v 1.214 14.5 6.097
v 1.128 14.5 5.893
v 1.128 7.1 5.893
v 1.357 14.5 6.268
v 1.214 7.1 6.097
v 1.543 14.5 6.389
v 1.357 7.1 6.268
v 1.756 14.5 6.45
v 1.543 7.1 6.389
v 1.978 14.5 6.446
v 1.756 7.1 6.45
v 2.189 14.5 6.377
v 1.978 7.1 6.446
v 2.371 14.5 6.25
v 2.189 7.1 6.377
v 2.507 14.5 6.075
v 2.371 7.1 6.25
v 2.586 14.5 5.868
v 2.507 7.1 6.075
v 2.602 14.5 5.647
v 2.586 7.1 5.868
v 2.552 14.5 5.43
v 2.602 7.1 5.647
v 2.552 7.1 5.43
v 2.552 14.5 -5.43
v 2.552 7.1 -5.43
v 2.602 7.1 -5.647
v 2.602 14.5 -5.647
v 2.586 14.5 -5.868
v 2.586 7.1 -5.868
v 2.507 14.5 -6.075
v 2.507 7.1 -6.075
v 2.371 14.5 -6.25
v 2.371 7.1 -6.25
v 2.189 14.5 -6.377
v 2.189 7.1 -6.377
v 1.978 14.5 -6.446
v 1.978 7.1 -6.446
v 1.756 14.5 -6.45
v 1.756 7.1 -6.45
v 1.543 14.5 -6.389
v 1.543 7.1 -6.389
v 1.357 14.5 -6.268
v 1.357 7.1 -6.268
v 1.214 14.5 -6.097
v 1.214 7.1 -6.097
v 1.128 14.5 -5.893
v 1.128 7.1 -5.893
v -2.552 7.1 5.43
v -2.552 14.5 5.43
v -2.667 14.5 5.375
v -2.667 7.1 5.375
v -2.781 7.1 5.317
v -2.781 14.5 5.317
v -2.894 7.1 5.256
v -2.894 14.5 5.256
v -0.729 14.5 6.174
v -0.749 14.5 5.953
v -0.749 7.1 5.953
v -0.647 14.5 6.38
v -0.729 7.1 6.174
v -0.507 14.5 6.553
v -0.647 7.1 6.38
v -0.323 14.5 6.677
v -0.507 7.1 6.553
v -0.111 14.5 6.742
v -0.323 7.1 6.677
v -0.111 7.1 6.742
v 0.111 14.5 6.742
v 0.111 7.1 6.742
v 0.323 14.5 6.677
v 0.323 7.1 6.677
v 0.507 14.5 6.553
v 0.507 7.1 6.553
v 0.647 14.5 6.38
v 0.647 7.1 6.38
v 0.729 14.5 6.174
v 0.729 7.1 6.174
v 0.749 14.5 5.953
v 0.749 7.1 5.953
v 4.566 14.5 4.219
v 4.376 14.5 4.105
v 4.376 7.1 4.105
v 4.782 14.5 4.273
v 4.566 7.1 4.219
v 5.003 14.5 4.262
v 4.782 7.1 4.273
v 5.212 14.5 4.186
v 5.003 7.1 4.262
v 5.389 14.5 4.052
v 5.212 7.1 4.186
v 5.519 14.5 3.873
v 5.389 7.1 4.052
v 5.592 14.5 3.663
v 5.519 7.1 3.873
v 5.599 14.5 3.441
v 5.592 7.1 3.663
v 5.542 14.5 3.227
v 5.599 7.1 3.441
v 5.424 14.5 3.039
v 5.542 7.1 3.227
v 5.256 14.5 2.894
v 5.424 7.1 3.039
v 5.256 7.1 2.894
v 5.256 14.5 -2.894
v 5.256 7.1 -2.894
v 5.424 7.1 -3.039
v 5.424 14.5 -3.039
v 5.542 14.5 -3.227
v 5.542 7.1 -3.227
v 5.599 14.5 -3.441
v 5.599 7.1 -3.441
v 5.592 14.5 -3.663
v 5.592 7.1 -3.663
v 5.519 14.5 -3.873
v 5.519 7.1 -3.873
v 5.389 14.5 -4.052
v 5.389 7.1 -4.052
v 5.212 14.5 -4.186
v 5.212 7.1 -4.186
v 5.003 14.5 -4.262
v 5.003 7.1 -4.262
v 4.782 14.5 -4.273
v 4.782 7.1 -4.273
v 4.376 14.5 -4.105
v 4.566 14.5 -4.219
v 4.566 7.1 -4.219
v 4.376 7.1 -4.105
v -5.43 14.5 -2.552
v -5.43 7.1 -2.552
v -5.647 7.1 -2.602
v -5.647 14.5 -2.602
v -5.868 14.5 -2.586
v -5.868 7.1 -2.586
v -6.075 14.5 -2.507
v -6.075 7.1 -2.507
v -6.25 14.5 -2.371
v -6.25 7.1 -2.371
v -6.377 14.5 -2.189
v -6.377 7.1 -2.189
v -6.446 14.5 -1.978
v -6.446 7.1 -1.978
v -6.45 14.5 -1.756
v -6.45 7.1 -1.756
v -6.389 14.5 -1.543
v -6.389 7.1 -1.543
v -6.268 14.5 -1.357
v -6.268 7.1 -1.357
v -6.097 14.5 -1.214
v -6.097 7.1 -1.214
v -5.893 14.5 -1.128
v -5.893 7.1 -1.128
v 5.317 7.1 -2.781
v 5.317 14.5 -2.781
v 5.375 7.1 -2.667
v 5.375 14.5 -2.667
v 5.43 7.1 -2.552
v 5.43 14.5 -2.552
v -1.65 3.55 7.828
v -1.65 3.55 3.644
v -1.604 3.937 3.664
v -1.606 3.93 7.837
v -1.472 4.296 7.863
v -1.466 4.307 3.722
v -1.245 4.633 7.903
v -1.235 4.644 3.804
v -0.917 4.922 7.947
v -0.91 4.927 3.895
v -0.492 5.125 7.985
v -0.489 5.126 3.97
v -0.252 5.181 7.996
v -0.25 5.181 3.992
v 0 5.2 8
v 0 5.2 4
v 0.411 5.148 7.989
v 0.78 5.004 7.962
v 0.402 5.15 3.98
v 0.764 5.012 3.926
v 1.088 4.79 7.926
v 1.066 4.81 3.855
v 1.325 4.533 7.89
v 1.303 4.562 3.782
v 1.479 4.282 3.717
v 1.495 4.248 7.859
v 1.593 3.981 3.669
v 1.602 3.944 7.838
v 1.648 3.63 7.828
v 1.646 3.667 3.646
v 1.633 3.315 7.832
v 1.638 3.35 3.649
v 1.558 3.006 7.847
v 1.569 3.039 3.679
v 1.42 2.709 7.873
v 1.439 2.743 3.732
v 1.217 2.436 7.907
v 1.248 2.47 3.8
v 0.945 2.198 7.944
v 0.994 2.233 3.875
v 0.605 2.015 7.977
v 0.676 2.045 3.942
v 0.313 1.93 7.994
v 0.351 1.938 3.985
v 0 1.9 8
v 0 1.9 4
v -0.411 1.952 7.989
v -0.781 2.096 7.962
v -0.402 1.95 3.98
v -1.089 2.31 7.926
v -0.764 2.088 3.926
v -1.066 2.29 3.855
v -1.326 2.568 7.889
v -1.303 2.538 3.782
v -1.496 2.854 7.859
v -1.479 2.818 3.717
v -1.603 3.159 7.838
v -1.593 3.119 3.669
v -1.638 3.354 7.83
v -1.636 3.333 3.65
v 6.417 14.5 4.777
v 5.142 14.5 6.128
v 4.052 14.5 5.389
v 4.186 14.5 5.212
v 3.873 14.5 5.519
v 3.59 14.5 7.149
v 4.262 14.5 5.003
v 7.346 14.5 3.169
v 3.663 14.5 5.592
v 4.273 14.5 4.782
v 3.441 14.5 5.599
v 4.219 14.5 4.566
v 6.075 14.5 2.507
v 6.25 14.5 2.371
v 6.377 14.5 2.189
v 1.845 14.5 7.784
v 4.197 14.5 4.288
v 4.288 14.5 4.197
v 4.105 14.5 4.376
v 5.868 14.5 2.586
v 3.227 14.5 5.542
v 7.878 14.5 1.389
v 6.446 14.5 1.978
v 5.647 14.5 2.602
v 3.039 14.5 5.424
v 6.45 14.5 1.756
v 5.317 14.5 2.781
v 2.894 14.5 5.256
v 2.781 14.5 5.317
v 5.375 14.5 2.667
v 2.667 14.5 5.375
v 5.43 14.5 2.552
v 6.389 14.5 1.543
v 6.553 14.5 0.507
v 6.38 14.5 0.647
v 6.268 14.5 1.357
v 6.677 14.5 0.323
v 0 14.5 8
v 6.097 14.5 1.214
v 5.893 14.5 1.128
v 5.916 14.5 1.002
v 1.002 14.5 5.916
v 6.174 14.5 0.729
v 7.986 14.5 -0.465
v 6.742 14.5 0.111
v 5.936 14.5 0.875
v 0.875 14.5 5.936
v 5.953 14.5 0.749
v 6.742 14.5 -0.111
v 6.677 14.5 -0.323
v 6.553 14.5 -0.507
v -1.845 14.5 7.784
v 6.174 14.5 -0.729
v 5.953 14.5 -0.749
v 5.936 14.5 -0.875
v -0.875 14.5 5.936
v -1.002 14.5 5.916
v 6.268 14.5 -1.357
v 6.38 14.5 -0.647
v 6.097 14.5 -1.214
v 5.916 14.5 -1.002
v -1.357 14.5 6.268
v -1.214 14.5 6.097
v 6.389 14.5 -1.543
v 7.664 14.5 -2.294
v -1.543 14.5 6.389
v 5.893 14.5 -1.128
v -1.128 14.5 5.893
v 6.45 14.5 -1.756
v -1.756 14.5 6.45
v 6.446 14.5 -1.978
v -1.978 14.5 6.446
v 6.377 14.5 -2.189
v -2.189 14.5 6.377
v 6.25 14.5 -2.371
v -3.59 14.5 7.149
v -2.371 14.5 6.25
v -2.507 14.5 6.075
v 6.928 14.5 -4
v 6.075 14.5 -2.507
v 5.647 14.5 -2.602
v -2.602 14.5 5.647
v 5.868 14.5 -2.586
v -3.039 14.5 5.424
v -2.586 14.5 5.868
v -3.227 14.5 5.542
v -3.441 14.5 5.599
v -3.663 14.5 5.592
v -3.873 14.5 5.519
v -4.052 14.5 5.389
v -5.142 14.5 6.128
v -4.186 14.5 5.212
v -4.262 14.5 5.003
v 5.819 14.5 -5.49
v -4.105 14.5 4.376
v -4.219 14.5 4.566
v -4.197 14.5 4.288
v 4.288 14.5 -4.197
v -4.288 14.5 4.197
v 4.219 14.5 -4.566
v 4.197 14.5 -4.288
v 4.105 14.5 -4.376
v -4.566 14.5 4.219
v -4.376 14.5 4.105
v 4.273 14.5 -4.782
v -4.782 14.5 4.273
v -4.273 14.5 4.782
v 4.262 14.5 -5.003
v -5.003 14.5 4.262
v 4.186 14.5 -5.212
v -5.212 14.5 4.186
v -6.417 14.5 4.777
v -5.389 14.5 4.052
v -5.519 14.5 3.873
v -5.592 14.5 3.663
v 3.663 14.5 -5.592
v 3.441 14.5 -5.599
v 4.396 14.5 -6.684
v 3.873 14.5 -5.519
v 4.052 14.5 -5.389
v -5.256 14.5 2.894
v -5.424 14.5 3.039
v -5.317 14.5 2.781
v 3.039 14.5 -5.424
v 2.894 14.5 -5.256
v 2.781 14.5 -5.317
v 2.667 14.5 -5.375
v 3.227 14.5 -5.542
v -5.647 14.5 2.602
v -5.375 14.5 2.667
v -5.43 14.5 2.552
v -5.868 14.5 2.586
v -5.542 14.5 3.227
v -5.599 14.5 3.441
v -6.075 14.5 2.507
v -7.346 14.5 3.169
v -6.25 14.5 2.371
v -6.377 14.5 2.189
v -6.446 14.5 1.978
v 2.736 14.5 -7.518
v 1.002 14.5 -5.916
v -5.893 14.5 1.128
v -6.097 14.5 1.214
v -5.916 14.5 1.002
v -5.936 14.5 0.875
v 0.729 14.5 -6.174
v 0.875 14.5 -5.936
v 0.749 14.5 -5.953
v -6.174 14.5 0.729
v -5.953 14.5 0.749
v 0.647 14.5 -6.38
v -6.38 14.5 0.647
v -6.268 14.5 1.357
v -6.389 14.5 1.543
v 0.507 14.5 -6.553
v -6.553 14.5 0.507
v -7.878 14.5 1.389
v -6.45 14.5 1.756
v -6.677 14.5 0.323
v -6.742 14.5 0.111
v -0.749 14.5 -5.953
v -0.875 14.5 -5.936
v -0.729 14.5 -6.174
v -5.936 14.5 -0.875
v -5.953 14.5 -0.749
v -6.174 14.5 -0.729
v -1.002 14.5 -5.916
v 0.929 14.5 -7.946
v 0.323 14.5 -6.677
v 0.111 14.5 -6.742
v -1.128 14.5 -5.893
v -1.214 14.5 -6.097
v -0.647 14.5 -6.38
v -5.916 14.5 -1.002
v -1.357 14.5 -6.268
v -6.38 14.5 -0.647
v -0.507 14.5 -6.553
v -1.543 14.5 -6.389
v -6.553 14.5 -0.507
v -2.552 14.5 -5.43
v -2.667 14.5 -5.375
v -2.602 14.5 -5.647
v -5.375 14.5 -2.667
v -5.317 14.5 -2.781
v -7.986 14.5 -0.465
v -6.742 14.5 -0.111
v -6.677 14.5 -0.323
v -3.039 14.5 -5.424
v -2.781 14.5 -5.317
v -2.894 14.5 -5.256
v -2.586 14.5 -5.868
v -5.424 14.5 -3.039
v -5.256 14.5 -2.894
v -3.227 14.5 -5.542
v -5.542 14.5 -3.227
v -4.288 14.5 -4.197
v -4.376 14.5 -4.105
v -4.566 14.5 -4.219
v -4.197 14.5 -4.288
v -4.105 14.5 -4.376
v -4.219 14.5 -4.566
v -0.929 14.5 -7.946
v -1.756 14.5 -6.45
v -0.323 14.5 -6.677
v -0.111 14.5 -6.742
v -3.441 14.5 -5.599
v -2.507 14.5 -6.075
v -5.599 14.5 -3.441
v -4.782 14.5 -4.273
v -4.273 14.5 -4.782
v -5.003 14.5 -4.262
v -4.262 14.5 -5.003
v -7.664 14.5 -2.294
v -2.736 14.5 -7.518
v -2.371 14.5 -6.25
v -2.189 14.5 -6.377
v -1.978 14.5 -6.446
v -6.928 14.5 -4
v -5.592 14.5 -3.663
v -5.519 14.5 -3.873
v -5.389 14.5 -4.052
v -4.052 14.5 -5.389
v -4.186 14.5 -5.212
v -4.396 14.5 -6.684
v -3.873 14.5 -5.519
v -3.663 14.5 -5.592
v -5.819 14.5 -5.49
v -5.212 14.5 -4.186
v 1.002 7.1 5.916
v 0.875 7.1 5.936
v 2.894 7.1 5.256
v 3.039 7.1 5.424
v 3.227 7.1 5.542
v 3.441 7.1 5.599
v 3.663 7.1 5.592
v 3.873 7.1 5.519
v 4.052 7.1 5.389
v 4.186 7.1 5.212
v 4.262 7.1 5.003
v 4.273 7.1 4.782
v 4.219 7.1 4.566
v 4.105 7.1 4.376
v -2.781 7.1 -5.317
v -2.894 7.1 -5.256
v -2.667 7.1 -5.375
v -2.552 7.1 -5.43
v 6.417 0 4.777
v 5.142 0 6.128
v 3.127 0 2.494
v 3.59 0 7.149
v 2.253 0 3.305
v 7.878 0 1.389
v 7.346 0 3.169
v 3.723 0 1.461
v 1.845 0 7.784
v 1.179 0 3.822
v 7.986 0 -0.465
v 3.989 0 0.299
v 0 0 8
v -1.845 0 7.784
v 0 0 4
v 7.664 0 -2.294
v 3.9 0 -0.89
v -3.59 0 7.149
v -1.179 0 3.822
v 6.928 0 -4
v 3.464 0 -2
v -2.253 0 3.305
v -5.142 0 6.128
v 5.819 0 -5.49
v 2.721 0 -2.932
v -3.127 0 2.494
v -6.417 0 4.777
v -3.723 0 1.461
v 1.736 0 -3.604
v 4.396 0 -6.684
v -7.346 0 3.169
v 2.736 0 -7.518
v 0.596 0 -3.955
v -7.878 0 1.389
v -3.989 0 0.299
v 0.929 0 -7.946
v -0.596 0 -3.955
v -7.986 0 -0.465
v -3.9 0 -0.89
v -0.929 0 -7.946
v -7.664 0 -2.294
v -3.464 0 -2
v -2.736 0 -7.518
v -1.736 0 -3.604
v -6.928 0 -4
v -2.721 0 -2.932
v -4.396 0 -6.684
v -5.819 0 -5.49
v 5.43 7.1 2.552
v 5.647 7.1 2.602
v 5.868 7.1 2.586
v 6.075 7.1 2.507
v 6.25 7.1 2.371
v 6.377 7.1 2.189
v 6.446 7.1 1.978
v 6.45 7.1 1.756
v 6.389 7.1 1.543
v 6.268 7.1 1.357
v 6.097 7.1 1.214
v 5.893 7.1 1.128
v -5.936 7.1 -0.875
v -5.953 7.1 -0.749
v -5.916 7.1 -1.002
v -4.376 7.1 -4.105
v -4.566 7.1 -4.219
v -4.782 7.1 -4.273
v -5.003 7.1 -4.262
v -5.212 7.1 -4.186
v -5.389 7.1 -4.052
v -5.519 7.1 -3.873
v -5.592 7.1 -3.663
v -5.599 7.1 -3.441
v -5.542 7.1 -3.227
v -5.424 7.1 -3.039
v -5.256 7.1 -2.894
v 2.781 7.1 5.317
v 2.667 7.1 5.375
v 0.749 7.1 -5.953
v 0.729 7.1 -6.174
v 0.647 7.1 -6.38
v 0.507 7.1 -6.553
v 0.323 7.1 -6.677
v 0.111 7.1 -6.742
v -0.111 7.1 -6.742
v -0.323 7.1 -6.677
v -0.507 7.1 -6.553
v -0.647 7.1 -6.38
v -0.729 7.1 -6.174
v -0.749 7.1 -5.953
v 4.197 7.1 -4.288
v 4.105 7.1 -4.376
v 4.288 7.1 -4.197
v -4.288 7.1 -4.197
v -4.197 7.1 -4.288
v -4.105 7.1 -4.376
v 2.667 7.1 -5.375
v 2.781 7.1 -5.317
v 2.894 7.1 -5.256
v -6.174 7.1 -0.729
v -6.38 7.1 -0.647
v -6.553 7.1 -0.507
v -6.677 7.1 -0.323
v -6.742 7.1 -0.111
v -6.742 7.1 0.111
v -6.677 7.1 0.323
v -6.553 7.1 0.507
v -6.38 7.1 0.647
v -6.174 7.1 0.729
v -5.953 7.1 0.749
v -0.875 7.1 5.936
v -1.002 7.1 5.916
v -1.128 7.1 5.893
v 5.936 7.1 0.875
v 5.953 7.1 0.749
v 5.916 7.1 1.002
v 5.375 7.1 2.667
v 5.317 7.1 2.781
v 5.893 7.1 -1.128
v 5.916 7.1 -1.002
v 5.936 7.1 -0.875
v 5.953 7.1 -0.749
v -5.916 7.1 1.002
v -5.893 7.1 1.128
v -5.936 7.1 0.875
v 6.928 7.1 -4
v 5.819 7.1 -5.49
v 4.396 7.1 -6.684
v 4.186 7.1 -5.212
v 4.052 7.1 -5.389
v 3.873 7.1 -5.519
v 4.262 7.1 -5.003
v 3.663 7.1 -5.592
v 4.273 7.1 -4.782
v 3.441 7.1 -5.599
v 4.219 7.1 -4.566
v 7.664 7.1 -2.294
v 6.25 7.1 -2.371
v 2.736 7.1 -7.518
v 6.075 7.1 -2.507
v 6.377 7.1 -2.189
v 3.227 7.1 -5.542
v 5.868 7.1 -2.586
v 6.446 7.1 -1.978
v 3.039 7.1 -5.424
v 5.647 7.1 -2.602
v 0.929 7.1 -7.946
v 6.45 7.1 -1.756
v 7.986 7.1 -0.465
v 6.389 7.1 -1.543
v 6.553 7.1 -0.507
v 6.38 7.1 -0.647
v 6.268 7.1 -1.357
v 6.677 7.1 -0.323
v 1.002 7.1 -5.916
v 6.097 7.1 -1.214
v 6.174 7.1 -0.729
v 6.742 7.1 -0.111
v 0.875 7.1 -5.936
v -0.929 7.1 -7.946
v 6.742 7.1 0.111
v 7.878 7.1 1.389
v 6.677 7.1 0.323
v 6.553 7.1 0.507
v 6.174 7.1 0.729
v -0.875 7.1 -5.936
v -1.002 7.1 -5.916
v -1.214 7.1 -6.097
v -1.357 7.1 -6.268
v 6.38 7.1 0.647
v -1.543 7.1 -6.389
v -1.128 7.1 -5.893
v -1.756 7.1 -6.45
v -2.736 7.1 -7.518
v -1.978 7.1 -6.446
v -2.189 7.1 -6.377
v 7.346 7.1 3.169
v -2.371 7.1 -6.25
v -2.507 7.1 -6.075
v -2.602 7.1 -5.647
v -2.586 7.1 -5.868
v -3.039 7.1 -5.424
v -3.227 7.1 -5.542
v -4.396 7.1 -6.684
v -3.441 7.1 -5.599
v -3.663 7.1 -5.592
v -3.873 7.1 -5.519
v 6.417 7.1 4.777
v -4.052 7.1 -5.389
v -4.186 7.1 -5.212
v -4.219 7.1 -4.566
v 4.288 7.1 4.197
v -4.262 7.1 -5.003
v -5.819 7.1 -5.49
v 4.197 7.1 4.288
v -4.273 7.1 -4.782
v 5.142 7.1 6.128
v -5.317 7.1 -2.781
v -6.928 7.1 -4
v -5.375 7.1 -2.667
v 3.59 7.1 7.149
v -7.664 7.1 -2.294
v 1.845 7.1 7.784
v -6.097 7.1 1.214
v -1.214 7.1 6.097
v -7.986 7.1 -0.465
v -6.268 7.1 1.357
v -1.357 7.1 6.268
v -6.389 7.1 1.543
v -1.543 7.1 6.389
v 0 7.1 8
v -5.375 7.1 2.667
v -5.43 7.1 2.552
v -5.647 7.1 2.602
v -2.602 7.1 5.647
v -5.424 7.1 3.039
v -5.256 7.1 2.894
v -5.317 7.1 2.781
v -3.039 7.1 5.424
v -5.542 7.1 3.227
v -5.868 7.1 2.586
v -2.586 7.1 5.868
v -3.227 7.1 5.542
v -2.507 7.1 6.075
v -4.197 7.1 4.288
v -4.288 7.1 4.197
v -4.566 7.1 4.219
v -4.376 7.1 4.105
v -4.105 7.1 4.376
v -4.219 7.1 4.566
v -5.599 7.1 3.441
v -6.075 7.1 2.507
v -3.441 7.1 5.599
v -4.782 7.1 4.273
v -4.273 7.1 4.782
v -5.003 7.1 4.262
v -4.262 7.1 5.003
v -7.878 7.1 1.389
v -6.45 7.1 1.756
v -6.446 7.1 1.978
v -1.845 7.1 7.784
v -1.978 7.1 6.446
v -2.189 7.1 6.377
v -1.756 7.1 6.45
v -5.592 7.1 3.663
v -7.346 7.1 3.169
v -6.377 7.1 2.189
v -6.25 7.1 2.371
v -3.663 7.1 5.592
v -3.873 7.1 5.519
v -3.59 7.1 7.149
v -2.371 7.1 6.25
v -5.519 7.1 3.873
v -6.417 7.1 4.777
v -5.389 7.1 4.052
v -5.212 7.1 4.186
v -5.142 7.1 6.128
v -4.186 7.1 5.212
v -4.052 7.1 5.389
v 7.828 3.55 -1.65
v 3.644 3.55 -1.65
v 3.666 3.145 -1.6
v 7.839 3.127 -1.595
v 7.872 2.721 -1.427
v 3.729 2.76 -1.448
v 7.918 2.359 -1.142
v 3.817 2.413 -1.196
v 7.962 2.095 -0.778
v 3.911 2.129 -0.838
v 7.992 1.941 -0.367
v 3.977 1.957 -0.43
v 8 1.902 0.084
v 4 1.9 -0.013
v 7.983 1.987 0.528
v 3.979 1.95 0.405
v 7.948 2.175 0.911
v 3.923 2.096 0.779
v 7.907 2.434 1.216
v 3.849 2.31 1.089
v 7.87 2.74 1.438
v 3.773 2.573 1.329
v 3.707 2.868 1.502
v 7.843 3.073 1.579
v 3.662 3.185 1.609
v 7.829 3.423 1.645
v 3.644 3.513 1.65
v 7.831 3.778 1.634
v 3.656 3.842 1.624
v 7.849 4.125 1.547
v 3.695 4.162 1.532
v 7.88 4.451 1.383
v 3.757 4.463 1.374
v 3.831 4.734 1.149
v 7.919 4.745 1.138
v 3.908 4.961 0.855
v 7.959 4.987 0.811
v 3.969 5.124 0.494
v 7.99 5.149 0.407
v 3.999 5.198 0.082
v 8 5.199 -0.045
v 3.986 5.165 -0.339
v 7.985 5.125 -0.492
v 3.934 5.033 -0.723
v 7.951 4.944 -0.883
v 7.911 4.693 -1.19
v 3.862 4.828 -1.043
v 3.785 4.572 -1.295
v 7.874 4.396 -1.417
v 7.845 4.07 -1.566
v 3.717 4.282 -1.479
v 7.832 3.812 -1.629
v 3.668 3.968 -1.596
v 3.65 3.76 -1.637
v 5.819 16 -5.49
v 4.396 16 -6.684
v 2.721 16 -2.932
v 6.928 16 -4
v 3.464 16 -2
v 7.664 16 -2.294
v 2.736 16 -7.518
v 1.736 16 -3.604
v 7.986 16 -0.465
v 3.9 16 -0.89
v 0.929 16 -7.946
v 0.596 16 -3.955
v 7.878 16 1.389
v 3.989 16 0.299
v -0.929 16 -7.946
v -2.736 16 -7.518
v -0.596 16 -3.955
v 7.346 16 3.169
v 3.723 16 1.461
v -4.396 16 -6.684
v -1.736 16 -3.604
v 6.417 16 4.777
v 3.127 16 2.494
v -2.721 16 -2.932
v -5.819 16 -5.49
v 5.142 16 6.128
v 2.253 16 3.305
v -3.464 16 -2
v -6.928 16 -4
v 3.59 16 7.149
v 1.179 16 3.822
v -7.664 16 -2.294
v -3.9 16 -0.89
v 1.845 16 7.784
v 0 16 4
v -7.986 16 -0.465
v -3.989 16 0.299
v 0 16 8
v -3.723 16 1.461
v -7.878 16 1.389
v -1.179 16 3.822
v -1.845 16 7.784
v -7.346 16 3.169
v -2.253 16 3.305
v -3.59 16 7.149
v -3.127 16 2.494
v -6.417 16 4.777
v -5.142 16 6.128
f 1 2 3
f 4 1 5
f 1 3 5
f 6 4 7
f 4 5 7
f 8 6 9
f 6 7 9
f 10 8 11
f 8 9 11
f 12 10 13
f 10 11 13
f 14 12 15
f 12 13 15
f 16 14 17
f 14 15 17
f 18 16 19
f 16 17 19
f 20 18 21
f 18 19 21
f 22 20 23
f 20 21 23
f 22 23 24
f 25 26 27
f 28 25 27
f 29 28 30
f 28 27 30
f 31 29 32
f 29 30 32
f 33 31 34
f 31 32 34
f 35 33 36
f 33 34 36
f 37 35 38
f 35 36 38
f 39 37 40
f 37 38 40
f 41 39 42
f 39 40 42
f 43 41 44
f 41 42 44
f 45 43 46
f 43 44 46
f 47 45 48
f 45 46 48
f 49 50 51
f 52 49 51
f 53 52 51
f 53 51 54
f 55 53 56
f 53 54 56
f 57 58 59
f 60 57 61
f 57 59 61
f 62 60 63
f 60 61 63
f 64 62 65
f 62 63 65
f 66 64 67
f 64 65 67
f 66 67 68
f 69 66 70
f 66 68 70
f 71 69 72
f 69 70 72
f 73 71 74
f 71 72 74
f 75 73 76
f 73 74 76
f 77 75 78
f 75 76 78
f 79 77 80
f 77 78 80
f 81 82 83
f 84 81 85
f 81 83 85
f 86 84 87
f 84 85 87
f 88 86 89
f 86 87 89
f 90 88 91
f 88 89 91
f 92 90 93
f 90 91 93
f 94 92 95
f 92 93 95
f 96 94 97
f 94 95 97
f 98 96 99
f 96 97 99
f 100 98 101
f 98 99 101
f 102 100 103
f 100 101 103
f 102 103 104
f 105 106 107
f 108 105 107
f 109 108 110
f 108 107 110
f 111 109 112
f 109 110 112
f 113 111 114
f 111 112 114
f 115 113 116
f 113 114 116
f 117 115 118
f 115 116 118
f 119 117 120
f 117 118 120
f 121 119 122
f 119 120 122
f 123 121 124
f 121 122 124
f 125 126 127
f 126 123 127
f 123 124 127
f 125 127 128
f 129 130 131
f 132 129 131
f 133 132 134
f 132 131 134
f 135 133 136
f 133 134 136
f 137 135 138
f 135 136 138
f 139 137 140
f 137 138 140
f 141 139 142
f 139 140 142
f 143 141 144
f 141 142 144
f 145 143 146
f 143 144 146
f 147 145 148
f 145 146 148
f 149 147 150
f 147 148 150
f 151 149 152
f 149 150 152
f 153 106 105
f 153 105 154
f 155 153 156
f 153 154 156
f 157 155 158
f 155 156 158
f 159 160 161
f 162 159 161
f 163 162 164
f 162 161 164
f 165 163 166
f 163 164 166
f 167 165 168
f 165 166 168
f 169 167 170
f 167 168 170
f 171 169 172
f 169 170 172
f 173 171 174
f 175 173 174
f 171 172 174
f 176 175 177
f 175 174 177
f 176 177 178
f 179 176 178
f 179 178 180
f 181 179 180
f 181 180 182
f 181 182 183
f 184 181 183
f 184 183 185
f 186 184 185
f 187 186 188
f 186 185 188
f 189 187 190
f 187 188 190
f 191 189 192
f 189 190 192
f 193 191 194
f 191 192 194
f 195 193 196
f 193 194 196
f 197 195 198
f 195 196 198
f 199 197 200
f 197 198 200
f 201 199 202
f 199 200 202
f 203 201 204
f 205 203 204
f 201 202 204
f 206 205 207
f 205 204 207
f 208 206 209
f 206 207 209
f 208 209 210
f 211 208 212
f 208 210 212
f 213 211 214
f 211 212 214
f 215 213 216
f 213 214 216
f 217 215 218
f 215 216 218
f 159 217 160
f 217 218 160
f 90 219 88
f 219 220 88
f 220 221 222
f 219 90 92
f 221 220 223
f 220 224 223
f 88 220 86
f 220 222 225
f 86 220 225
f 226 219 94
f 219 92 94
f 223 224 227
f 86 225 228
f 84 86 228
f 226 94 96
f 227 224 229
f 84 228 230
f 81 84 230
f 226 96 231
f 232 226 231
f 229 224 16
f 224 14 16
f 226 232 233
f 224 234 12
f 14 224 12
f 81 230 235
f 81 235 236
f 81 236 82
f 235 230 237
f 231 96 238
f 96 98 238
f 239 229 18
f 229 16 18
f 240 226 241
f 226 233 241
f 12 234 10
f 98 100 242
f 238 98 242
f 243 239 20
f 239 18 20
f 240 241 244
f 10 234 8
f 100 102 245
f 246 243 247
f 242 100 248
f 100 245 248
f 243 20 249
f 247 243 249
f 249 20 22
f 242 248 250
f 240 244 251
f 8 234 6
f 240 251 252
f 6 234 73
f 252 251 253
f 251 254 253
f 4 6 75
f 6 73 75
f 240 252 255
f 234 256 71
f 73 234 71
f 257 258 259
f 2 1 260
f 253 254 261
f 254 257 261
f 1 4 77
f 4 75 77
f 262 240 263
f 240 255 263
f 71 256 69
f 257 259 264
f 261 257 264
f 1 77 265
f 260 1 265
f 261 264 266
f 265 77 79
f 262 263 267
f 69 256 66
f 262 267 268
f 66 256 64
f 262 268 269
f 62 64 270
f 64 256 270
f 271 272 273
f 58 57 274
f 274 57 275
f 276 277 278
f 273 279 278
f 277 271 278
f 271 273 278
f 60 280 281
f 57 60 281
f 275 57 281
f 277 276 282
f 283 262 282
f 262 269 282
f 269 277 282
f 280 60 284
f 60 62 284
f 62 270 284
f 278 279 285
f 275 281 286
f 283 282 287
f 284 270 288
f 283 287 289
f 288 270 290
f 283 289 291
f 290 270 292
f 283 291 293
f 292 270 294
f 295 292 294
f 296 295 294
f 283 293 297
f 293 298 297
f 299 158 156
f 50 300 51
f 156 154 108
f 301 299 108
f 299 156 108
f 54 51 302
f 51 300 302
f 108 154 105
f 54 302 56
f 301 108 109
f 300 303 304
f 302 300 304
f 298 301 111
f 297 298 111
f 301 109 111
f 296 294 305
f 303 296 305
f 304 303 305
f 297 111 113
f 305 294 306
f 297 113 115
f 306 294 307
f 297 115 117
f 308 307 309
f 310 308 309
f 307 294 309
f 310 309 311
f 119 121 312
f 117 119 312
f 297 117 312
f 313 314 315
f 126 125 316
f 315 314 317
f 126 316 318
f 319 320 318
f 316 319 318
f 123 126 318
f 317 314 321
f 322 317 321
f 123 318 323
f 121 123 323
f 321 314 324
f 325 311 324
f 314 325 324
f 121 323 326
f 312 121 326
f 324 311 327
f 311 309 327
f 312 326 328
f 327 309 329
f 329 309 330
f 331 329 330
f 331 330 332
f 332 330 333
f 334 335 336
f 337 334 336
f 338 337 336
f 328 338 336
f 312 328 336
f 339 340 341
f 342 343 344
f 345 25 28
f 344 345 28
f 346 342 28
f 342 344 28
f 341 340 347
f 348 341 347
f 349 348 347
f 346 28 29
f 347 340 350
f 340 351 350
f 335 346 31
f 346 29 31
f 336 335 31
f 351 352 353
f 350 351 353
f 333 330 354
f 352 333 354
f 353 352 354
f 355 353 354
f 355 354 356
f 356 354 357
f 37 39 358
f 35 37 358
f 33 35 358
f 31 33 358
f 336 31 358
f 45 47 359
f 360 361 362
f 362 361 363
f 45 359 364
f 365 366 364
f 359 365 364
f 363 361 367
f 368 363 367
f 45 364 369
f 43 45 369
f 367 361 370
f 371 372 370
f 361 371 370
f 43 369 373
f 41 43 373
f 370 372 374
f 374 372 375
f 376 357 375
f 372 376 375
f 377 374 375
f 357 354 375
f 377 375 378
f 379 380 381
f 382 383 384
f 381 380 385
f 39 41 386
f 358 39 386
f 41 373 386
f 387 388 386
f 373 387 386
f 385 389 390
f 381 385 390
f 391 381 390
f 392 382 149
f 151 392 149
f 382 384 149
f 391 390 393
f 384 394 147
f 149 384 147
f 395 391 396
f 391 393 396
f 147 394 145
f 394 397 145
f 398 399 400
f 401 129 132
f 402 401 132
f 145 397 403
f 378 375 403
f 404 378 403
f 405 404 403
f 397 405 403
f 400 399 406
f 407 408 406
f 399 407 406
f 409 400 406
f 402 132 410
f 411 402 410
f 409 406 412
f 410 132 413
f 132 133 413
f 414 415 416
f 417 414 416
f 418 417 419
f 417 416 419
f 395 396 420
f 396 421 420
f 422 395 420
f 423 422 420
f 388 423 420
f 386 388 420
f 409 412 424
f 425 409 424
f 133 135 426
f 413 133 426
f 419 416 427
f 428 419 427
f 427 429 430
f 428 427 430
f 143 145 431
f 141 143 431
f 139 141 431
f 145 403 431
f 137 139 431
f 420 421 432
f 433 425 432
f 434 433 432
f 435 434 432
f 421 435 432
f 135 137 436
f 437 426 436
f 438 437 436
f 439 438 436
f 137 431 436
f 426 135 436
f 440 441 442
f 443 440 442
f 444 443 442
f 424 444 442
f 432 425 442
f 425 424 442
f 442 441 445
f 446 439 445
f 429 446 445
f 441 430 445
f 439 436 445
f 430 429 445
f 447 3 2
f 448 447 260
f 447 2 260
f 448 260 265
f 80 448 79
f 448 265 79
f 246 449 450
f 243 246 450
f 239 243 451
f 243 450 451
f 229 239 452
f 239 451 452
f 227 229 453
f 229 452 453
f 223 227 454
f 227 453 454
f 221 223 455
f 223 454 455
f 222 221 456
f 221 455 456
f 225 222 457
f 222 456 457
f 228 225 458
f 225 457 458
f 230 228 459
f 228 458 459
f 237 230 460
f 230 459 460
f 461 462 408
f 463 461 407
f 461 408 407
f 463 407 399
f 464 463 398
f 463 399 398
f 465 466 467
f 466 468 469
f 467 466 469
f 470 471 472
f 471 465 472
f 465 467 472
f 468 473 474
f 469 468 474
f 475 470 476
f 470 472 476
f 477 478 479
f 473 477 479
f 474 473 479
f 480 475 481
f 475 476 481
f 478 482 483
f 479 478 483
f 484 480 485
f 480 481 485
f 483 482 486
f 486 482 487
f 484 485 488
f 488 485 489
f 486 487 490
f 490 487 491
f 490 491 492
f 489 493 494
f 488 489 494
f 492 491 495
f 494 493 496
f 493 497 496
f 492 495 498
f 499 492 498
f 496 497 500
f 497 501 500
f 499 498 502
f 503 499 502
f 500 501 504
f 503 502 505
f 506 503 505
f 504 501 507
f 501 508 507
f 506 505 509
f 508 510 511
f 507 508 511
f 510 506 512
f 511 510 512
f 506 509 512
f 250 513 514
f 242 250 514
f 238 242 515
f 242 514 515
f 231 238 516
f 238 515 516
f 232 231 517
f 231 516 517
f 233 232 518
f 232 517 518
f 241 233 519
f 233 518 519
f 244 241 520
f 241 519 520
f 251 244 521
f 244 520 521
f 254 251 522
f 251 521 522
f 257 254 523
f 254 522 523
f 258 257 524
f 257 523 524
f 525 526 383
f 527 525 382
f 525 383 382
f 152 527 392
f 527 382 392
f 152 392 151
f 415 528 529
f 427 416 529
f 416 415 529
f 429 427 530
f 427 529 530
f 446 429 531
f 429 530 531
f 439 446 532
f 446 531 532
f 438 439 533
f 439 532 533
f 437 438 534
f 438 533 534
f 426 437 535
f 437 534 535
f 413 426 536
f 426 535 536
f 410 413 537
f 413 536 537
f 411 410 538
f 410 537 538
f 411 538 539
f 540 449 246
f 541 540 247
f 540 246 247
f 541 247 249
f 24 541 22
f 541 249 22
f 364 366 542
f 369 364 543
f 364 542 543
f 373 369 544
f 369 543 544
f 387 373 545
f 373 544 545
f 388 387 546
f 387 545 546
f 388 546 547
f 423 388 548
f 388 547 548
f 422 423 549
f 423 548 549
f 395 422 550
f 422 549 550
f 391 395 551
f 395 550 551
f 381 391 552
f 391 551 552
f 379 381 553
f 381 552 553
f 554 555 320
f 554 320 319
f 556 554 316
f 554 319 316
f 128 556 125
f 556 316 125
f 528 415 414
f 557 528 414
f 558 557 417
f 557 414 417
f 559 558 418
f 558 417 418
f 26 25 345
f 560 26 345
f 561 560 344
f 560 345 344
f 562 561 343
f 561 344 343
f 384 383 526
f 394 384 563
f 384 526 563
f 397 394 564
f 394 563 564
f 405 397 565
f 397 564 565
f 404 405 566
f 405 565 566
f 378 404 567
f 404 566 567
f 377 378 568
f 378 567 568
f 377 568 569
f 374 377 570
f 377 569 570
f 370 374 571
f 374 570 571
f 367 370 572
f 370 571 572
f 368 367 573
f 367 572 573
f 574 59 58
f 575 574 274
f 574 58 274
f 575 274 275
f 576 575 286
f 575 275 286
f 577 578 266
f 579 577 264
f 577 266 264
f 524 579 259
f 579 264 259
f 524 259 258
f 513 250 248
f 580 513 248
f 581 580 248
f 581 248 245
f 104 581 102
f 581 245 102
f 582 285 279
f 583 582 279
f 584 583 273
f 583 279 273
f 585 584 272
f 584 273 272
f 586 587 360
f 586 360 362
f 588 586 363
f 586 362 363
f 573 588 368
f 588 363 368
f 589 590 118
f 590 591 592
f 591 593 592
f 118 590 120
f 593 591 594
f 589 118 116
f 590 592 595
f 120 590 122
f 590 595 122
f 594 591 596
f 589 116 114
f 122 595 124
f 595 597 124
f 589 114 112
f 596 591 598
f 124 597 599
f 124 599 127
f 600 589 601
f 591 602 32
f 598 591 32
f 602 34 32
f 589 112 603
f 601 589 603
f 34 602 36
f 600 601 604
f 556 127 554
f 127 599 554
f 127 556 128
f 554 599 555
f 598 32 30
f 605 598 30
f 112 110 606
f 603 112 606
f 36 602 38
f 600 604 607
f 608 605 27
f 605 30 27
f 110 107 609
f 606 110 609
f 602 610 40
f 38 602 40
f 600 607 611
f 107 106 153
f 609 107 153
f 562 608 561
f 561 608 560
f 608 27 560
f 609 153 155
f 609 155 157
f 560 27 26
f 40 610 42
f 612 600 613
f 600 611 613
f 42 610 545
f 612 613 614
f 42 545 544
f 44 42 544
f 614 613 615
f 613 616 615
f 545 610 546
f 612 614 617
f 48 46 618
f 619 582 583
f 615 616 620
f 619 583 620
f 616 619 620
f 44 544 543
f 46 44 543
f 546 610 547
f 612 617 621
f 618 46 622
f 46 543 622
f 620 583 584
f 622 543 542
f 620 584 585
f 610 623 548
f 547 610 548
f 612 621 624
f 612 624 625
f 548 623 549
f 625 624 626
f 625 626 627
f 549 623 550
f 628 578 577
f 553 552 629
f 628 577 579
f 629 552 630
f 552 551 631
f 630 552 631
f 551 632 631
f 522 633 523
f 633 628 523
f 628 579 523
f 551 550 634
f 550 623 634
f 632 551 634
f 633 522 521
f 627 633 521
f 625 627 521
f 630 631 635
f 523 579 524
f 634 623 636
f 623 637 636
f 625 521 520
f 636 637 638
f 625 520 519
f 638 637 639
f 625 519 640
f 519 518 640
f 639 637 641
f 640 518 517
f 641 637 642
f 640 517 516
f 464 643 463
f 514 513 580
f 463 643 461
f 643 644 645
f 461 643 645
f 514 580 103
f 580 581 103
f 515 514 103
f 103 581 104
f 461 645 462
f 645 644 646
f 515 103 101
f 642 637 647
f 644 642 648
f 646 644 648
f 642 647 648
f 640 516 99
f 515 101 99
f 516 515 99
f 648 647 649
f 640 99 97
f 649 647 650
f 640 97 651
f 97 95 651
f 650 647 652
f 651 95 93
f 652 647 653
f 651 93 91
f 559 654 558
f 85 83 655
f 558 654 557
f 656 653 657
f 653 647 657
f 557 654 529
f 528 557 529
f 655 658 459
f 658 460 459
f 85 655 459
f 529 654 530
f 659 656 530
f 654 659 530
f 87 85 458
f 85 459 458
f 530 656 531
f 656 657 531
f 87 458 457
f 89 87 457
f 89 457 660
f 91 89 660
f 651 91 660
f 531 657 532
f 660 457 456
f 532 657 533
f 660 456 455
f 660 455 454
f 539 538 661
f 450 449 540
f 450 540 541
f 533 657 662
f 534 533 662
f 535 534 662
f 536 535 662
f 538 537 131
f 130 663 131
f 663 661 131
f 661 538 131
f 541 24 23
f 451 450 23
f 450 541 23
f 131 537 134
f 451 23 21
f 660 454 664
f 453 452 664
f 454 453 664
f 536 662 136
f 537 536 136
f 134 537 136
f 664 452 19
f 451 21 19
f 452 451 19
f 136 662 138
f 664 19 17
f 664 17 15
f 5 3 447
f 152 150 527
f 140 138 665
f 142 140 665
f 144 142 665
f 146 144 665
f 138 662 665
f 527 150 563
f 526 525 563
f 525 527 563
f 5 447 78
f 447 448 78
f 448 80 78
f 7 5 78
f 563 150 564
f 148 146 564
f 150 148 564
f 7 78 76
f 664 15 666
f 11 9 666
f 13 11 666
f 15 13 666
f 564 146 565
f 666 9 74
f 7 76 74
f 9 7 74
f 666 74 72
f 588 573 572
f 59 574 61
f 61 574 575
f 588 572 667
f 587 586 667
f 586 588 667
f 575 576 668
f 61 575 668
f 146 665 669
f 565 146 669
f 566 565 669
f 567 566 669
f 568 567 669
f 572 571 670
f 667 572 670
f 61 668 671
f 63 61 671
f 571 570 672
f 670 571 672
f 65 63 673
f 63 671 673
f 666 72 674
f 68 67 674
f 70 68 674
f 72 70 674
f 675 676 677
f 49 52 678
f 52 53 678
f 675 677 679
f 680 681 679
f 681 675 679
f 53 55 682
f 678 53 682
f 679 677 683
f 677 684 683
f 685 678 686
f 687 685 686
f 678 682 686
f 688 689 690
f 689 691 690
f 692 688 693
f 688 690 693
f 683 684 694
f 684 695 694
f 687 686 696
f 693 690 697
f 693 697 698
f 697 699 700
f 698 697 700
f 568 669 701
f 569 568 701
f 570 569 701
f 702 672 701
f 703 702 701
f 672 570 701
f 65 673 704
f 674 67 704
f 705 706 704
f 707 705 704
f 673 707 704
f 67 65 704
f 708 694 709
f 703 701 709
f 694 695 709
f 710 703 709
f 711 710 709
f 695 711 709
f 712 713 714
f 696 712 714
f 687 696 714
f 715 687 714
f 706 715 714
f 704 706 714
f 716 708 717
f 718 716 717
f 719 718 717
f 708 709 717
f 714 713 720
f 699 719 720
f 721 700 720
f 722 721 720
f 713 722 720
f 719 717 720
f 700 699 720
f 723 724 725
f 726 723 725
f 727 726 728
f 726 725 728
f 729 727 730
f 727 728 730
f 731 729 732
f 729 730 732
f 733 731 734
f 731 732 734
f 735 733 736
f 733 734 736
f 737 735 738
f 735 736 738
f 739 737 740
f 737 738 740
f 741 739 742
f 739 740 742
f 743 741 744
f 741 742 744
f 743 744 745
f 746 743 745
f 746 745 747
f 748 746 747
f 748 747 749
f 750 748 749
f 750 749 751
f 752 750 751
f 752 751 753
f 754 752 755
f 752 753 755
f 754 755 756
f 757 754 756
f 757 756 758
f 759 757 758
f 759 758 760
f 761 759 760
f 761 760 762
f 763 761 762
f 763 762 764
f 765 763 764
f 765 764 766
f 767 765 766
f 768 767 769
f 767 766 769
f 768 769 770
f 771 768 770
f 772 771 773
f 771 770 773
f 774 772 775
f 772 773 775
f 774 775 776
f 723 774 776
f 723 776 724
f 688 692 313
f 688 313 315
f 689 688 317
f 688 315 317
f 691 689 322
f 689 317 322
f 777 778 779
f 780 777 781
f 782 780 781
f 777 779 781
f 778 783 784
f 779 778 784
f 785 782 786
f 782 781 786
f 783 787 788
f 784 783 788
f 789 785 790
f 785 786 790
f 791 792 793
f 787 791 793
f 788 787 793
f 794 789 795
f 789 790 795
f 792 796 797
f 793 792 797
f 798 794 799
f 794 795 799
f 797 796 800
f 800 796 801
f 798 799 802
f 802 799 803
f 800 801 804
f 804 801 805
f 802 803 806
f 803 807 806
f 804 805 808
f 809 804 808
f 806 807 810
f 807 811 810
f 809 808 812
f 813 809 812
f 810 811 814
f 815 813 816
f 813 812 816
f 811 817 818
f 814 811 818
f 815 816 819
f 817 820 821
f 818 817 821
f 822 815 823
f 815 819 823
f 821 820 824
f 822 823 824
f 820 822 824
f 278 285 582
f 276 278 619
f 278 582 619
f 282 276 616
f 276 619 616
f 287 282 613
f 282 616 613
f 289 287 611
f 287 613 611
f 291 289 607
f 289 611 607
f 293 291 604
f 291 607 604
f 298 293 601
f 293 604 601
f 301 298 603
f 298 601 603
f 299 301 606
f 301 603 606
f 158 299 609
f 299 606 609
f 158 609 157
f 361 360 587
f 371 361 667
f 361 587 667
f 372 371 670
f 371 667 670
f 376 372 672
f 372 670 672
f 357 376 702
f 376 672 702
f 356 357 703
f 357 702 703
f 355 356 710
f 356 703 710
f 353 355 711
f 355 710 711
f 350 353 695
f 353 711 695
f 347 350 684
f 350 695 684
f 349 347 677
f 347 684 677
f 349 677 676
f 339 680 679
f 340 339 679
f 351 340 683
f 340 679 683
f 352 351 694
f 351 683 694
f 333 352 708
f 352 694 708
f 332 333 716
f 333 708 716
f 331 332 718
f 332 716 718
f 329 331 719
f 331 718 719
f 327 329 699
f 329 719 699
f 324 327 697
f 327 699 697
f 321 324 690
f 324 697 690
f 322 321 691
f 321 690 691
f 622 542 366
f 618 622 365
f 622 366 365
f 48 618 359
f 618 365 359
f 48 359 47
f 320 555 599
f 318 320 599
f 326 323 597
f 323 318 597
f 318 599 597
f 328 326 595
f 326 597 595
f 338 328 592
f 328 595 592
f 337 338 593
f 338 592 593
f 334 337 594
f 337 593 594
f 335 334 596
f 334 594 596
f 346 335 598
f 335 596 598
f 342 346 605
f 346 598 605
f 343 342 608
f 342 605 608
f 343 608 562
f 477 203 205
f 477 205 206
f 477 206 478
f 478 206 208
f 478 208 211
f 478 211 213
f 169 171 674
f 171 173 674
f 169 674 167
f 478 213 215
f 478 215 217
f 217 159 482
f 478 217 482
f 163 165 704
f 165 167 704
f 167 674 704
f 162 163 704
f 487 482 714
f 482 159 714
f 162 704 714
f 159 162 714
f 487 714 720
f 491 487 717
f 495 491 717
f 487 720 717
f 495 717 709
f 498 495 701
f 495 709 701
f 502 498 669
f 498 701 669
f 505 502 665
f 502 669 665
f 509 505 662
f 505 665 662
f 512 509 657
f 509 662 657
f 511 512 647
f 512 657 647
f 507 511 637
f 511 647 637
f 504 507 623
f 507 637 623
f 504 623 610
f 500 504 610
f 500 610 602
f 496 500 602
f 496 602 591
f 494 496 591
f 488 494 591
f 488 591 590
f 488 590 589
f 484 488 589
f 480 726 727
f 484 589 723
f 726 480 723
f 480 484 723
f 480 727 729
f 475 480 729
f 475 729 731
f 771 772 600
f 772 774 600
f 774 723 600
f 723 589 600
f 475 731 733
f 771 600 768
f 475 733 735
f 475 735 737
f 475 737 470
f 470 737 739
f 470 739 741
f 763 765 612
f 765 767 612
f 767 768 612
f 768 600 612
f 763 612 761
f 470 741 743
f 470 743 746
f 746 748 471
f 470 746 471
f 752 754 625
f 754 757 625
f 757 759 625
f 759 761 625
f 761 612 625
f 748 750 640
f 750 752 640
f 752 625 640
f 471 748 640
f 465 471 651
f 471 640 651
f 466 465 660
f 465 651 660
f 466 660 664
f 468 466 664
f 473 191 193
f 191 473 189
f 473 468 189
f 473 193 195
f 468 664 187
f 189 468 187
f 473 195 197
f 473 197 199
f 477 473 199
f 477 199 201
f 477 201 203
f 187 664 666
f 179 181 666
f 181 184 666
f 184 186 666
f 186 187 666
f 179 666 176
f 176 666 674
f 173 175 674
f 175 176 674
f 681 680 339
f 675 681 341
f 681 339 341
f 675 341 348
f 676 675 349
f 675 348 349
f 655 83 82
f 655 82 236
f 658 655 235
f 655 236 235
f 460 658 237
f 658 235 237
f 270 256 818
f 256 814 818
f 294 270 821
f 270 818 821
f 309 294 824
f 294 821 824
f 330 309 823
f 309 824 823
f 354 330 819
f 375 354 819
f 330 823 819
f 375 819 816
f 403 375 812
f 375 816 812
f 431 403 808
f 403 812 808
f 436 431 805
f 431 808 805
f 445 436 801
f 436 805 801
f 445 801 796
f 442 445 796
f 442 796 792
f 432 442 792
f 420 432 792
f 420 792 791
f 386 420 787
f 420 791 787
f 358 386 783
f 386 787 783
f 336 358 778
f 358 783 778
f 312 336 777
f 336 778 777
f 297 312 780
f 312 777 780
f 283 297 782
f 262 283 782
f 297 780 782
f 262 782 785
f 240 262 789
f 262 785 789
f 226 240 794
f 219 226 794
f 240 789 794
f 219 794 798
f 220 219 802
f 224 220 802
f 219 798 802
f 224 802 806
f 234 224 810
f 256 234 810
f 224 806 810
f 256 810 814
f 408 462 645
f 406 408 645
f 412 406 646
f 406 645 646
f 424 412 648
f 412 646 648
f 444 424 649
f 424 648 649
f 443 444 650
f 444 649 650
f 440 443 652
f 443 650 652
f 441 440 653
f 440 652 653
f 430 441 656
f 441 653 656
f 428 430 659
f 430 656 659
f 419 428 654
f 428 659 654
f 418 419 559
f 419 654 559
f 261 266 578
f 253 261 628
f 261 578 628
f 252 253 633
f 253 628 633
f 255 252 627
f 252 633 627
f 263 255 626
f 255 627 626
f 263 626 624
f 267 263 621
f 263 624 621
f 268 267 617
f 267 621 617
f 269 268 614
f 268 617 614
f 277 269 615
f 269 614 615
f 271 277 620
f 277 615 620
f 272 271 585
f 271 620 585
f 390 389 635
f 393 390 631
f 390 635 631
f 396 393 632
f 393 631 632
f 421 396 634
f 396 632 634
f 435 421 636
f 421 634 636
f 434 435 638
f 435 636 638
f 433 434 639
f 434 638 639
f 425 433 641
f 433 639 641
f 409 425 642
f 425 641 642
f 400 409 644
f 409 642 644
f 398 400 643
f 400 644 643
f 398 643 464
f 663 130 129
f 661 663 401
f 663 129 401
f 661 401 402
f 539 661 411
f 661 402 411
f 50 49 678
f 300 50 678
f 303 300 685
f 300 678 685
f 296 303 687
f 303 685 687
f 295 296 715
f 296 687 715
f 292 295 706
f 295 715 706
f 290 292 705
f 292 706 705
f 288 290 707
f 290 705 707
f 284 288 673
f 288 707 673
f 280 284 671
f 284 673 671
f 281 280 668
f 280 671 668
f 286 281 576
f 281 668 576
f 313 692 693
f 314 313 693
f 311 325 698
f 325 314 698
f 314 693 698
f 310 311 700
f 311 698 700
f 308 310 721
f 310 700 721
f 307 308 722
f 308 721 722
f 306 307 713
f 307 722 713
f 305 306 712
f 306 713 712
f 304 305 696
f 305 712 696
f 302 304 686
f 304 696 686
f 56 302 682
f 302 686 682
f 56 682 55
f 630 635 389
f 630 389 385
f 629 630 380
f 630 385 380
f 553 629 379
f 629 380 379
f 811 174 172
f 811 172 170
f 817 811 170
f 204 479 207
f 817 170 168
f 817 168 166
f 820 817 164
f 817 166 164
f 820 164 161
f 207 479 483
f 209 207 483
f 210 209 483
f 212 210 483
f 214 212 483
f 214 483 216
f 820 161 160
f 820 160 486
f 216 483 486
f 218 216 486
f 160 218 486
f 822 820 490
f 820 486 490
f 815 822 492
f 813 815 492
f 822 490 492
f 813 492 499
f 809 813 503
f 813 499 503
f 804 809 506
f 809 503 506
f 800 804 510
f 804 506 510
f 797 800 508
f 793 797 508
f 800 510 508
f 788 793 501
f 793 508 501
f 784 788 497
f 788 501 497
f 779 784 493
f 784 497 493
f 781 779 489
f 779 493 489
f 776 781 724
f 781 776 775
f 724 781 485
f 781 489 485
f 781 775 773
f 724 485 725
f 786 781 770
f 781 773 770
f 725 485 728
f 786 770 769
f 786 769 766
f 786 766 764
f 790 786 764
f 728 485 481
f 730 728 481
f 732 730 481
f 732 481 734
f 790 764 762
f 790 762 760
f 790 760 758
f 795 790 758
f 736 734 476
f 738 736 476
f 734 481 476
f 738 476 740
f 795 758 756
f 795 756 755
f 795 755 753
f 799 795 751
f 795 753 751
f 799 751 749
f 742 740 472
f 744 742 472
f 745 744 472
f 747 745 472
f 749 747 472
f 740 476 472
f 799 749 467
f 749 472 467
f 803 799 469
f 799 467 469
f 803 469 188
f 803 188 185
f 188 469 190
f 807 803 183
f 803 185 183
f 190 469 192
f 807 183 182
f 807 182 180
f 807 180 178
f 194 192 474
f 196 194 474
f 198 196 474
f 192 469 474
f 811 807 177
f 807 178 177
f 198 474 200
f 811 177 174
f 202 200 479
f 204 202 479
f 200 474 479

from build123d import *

# Parameters (mm, degrees)
HOLE_WIZARD_M4_1_D               = 3.3
HOLE_WIZARD_M4_1_DEPTH           = 10.1
HOLE_WIZARD_M4_1_TIP             = 0.991420021
HOLE_WIZARD_M4_1_ON_FACE_2_D     = 3.3
HOLE_WIZARD_M4_1_ON_FACE_2_DEPTH = 10.1
HOLE_WIZARD_M4_1_ON_FACE_2_TIP   = 0.991420021
SKETCH_9_R                       = 0.75
EXTRUDE_1_DEPTH                  = 8
PATTERN_CIRCULAR_1_COUNT         = 20


with BuildPart() as part:
    # 草图1 → 旋转1 (revolve)
    with BuildSketch(Plane.XY, mode=Mode.PRIVATE) as revolve_1_sk:
        Polygon((-8, 16), (-4, 16), (-4, 0), (-8, 0), (-8, 7.1), (-6, 7.1), (-6, 14.5), (-8, 14.5), align=None)
    revolve(revolve_1_sk.sketch.rotate(Axis((0, 30.877418673, 0), (0, -1, 0)), 270), axis=Axis((0, 30.877418673, 0), (0, -1, 0)))

    # M4 螺纹孔1
    with Locations(Plane(origin=(0, 3.55, 8), x_dir=(1, 0, 0), z_dir=(0, 0, 1))):
        with Locations((0, 0)):
            Hole(HOLE_WIZARD_M4_1_D / 2, depth=HOLE_WIZARD_M4_1_DEPTH)
            with Locations((0, 0, -(HOLE_WIZARD_M4_1_DEPTH + HOLE_WIZARD_M4_1_TIP / 2))):  # 118° drill point
                Cone(0, HOLE_WIZARD_M4_1_D / 2, HOLE_WIZARD_M4_1_TIP, mode=Mode.SUBTRACT)

    # M4 螺纹孔1 on face 2
    with Locations(Plane(origin=(8, 3.55, 0), x_dir=(0, 0, 1), z_dir=(1, 0, 0))):
        with Locations((0, 0)):
            Hole(HOLE_WIZARD_M4_1_ON_FACE_2_D / 2, depth=HOLE_WIZARD_M4_1_ON_FACE_2_DEPTH)
            with Locations((0, 0, -(HOLE_WIZARD_M4_1_ON_FACE_2_DEPTH + HOLE_WIZARD_M4_1_ON_FACE_2_TIP / 2))):  # 118° drill point
                Cone(0, HOLE_WIZARD_M4_1_ON_FACE_2_D / 2, HOLE_WIZARD_M4_1_ON_FACE_2_TIP, mode=Mode.SUBTRACT)

    # 草图9 → 凸台-拉伸1 (add)
    with BuildSketch(Plane(origin=(0, 7.1, 0), x_dir=(1, 0, 0), z_dir=(0, 1, 0))):
        with Locations((6, 0)):
            Circle(SKETCH_9_R)
    extrude_1 = extrude(amount=EXTRUDE_1_DEPTH)

    # 阵列(圆周)1: 凸台-拉伸1 ×20 about axis
    pattern_circular_1_axis = Axis((0, 0, 0), (0, 1, 0))
    for i in range(1, PATTERN_CIRCULAR_1_COUNT):
        add(extrude_1.rotate(pattern_circular_1_axis, i * 360 / PATTERN_CIRCULAR_1_COUNT))


solid = part.part
